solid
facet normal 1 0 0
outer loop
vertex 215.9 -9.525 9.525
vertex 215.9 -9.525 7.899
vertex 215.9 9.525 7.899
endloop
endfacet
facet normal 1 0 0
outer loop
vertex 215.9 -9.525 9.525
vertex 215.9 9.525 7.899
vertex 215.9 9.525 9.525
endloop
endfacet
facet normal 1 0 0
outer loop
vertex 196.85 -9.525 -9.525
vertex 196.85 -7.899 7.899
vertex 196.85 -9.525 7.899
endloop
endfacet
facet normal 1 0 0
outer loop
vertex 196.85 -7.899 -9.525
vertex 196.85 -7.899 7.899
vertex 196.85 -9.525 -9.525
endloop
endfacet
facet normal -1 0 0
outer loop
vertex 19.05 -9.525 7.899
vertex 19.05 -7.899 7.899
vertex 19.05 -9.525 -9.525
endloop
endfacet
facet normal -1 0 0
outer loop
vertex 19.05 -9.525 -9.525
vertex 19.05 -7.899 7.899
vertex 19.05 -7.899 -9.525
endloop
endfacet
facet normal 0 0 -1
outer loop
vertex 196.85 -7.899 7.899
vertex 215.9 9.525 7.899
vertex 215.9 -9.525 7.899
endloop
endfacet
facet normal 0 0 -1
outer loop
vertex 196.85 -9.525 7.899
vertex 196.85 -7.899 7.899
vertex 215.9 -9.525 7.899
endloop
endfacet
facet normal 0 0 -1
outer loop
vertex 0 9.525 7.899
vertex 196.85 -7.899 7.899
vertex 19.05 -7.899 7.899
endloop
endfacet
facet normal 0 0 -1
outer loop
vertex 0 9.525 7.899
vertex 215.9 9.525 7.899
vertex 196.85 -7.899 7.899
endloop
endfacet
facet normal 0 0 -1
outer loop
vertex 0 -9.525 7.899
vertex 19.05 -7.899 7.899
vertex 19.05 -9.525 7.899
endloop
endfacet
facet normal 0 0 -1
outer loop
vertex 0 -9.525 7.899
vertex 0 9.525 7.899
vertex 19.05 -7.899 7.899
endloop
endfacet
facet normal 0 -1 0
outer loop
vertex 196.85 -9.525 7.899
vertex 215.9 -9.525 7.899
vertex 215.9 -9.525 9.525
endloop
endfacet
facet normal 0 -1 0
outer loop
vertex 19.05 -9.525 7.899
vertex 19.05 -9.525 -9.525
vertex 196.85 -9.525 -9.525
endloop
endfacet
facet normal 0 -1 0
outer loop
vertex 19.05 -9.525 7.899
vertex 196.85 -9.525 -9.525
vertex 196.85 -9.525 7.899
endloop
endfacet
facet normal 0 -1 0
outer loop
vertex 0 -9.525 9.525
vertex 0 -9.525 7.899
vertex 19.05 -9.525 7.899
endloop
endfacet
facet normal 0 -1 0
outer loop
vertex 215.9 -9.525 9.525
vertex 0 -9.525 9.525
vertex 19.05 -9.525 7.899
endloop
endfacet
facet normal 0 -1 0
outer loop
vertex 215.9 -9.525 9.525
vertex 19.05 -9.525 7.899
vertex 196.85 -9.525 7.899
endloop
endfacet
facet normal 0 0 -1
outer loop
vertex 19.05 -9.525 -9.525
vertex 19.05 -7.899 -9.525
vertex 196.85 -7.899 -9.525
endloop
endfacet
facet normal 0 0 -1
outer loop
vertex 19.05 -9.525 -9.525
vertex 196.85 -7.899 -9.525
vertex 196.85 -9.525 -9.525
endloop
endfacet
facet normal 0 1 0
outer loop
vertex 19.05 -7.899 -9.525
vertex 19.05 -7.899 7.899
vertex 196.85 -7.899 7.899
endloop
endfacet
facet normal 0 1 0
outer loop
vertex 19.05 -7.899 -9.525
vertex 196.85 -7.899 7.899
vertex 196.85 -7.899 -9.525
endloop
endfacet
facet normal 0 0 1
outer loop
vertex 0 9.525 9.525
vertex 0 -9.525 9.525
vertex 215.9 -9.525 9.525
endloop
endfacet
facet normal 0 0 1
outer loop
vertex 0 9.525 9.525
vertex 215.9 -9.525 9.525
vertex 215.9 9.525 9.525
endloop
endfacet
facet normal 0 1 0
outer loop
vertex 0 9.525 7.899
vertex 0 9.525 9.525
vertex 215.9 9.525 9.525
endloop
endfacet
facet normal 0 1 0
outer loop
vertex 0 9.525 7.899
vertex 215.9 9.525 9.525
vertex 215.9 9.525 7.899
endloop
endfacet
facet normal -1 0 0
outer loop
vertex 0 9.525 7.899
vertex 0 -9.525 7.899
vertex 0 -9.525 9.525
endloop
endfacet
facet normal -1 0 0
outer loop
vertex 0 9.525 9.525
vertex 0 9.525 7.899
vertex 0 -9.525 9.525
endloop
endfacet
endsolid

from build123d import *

# Parameters (mm, degrees)
BOSS_EXTRUDE1_DEPTH = 215.9
CUT_EXTRUDE1_REACH  = 218.811
SKETCH2_W           = 19.05
SKETCH2_H           = 17.4244


with BuildPart() as part:
    # Sketch1 → Boss-Extrude1 (new body)
    with BuildSketch(Plane(origin=(0, 0, 0), x_dir=(0, 0, -1), z_dir=(1, 0, 0))):
        Polygon((-7.8994, -7.8994), (9.525, -7.8994), (9.525, -9.525), (-9.525, -9.525), (-9.525, 9.525), (-7.8994, 9.525), align=None)
    extrude(amount=BOSS_EXTRUDE1_DEPTH)

    # Sketch2 → Cut-Extrude1 (cut, up to next)
    with BuildSketch(Plane(origin=(0, -7.8994, 0), x_dir=(1, 0, 0), z_dir=(0, 1, 0)), mode=Mode.PRIVATE) as cut_extrude1_sk1:
        with Locations((9.525, 0.8128)):
            Rectangle(SKETCH2_W, SKETCH2_H)
    cut_extrude1_tool1 = extrude(cut_extrude1_sk1.sketch, amount=-CUT_EXTRUDE1_REACH, mode=Mode.PRIVATE) & part.part
    # Sketch2 → Cut-Extrude1 (cut, up to next)
    with BuildSketch(Plane(origin=(0, -7.8994, 0), x_dir=(1, 0, 0), z_dir=(0, 1, 0)), mode=Mode.PRIVATE) as cut_extrude1_sk2:
        with Locations((206.375, 0.8128)):
            Rectangle(SKETCH2_W, SKETCH2_H)
    cut_extrude1_tool2 = extrude(cut_extrude1_sk2.sketch, amount=-CUT_EXTRUDE1_REACH, mode=Mode.PRIVATE) & part.part
    add(cut_extrude1_tool1.solids().sort_by_distance((9.525, -7.8994, -0.8128))[0], mode=Mode.SUBTRACT)
    add(cut_extrude1_tool2.solids().sort_by_distance((206.375, -7.8994, -0.8128))[0], mode=Mode.SUBTRACT)


solid = part.part
